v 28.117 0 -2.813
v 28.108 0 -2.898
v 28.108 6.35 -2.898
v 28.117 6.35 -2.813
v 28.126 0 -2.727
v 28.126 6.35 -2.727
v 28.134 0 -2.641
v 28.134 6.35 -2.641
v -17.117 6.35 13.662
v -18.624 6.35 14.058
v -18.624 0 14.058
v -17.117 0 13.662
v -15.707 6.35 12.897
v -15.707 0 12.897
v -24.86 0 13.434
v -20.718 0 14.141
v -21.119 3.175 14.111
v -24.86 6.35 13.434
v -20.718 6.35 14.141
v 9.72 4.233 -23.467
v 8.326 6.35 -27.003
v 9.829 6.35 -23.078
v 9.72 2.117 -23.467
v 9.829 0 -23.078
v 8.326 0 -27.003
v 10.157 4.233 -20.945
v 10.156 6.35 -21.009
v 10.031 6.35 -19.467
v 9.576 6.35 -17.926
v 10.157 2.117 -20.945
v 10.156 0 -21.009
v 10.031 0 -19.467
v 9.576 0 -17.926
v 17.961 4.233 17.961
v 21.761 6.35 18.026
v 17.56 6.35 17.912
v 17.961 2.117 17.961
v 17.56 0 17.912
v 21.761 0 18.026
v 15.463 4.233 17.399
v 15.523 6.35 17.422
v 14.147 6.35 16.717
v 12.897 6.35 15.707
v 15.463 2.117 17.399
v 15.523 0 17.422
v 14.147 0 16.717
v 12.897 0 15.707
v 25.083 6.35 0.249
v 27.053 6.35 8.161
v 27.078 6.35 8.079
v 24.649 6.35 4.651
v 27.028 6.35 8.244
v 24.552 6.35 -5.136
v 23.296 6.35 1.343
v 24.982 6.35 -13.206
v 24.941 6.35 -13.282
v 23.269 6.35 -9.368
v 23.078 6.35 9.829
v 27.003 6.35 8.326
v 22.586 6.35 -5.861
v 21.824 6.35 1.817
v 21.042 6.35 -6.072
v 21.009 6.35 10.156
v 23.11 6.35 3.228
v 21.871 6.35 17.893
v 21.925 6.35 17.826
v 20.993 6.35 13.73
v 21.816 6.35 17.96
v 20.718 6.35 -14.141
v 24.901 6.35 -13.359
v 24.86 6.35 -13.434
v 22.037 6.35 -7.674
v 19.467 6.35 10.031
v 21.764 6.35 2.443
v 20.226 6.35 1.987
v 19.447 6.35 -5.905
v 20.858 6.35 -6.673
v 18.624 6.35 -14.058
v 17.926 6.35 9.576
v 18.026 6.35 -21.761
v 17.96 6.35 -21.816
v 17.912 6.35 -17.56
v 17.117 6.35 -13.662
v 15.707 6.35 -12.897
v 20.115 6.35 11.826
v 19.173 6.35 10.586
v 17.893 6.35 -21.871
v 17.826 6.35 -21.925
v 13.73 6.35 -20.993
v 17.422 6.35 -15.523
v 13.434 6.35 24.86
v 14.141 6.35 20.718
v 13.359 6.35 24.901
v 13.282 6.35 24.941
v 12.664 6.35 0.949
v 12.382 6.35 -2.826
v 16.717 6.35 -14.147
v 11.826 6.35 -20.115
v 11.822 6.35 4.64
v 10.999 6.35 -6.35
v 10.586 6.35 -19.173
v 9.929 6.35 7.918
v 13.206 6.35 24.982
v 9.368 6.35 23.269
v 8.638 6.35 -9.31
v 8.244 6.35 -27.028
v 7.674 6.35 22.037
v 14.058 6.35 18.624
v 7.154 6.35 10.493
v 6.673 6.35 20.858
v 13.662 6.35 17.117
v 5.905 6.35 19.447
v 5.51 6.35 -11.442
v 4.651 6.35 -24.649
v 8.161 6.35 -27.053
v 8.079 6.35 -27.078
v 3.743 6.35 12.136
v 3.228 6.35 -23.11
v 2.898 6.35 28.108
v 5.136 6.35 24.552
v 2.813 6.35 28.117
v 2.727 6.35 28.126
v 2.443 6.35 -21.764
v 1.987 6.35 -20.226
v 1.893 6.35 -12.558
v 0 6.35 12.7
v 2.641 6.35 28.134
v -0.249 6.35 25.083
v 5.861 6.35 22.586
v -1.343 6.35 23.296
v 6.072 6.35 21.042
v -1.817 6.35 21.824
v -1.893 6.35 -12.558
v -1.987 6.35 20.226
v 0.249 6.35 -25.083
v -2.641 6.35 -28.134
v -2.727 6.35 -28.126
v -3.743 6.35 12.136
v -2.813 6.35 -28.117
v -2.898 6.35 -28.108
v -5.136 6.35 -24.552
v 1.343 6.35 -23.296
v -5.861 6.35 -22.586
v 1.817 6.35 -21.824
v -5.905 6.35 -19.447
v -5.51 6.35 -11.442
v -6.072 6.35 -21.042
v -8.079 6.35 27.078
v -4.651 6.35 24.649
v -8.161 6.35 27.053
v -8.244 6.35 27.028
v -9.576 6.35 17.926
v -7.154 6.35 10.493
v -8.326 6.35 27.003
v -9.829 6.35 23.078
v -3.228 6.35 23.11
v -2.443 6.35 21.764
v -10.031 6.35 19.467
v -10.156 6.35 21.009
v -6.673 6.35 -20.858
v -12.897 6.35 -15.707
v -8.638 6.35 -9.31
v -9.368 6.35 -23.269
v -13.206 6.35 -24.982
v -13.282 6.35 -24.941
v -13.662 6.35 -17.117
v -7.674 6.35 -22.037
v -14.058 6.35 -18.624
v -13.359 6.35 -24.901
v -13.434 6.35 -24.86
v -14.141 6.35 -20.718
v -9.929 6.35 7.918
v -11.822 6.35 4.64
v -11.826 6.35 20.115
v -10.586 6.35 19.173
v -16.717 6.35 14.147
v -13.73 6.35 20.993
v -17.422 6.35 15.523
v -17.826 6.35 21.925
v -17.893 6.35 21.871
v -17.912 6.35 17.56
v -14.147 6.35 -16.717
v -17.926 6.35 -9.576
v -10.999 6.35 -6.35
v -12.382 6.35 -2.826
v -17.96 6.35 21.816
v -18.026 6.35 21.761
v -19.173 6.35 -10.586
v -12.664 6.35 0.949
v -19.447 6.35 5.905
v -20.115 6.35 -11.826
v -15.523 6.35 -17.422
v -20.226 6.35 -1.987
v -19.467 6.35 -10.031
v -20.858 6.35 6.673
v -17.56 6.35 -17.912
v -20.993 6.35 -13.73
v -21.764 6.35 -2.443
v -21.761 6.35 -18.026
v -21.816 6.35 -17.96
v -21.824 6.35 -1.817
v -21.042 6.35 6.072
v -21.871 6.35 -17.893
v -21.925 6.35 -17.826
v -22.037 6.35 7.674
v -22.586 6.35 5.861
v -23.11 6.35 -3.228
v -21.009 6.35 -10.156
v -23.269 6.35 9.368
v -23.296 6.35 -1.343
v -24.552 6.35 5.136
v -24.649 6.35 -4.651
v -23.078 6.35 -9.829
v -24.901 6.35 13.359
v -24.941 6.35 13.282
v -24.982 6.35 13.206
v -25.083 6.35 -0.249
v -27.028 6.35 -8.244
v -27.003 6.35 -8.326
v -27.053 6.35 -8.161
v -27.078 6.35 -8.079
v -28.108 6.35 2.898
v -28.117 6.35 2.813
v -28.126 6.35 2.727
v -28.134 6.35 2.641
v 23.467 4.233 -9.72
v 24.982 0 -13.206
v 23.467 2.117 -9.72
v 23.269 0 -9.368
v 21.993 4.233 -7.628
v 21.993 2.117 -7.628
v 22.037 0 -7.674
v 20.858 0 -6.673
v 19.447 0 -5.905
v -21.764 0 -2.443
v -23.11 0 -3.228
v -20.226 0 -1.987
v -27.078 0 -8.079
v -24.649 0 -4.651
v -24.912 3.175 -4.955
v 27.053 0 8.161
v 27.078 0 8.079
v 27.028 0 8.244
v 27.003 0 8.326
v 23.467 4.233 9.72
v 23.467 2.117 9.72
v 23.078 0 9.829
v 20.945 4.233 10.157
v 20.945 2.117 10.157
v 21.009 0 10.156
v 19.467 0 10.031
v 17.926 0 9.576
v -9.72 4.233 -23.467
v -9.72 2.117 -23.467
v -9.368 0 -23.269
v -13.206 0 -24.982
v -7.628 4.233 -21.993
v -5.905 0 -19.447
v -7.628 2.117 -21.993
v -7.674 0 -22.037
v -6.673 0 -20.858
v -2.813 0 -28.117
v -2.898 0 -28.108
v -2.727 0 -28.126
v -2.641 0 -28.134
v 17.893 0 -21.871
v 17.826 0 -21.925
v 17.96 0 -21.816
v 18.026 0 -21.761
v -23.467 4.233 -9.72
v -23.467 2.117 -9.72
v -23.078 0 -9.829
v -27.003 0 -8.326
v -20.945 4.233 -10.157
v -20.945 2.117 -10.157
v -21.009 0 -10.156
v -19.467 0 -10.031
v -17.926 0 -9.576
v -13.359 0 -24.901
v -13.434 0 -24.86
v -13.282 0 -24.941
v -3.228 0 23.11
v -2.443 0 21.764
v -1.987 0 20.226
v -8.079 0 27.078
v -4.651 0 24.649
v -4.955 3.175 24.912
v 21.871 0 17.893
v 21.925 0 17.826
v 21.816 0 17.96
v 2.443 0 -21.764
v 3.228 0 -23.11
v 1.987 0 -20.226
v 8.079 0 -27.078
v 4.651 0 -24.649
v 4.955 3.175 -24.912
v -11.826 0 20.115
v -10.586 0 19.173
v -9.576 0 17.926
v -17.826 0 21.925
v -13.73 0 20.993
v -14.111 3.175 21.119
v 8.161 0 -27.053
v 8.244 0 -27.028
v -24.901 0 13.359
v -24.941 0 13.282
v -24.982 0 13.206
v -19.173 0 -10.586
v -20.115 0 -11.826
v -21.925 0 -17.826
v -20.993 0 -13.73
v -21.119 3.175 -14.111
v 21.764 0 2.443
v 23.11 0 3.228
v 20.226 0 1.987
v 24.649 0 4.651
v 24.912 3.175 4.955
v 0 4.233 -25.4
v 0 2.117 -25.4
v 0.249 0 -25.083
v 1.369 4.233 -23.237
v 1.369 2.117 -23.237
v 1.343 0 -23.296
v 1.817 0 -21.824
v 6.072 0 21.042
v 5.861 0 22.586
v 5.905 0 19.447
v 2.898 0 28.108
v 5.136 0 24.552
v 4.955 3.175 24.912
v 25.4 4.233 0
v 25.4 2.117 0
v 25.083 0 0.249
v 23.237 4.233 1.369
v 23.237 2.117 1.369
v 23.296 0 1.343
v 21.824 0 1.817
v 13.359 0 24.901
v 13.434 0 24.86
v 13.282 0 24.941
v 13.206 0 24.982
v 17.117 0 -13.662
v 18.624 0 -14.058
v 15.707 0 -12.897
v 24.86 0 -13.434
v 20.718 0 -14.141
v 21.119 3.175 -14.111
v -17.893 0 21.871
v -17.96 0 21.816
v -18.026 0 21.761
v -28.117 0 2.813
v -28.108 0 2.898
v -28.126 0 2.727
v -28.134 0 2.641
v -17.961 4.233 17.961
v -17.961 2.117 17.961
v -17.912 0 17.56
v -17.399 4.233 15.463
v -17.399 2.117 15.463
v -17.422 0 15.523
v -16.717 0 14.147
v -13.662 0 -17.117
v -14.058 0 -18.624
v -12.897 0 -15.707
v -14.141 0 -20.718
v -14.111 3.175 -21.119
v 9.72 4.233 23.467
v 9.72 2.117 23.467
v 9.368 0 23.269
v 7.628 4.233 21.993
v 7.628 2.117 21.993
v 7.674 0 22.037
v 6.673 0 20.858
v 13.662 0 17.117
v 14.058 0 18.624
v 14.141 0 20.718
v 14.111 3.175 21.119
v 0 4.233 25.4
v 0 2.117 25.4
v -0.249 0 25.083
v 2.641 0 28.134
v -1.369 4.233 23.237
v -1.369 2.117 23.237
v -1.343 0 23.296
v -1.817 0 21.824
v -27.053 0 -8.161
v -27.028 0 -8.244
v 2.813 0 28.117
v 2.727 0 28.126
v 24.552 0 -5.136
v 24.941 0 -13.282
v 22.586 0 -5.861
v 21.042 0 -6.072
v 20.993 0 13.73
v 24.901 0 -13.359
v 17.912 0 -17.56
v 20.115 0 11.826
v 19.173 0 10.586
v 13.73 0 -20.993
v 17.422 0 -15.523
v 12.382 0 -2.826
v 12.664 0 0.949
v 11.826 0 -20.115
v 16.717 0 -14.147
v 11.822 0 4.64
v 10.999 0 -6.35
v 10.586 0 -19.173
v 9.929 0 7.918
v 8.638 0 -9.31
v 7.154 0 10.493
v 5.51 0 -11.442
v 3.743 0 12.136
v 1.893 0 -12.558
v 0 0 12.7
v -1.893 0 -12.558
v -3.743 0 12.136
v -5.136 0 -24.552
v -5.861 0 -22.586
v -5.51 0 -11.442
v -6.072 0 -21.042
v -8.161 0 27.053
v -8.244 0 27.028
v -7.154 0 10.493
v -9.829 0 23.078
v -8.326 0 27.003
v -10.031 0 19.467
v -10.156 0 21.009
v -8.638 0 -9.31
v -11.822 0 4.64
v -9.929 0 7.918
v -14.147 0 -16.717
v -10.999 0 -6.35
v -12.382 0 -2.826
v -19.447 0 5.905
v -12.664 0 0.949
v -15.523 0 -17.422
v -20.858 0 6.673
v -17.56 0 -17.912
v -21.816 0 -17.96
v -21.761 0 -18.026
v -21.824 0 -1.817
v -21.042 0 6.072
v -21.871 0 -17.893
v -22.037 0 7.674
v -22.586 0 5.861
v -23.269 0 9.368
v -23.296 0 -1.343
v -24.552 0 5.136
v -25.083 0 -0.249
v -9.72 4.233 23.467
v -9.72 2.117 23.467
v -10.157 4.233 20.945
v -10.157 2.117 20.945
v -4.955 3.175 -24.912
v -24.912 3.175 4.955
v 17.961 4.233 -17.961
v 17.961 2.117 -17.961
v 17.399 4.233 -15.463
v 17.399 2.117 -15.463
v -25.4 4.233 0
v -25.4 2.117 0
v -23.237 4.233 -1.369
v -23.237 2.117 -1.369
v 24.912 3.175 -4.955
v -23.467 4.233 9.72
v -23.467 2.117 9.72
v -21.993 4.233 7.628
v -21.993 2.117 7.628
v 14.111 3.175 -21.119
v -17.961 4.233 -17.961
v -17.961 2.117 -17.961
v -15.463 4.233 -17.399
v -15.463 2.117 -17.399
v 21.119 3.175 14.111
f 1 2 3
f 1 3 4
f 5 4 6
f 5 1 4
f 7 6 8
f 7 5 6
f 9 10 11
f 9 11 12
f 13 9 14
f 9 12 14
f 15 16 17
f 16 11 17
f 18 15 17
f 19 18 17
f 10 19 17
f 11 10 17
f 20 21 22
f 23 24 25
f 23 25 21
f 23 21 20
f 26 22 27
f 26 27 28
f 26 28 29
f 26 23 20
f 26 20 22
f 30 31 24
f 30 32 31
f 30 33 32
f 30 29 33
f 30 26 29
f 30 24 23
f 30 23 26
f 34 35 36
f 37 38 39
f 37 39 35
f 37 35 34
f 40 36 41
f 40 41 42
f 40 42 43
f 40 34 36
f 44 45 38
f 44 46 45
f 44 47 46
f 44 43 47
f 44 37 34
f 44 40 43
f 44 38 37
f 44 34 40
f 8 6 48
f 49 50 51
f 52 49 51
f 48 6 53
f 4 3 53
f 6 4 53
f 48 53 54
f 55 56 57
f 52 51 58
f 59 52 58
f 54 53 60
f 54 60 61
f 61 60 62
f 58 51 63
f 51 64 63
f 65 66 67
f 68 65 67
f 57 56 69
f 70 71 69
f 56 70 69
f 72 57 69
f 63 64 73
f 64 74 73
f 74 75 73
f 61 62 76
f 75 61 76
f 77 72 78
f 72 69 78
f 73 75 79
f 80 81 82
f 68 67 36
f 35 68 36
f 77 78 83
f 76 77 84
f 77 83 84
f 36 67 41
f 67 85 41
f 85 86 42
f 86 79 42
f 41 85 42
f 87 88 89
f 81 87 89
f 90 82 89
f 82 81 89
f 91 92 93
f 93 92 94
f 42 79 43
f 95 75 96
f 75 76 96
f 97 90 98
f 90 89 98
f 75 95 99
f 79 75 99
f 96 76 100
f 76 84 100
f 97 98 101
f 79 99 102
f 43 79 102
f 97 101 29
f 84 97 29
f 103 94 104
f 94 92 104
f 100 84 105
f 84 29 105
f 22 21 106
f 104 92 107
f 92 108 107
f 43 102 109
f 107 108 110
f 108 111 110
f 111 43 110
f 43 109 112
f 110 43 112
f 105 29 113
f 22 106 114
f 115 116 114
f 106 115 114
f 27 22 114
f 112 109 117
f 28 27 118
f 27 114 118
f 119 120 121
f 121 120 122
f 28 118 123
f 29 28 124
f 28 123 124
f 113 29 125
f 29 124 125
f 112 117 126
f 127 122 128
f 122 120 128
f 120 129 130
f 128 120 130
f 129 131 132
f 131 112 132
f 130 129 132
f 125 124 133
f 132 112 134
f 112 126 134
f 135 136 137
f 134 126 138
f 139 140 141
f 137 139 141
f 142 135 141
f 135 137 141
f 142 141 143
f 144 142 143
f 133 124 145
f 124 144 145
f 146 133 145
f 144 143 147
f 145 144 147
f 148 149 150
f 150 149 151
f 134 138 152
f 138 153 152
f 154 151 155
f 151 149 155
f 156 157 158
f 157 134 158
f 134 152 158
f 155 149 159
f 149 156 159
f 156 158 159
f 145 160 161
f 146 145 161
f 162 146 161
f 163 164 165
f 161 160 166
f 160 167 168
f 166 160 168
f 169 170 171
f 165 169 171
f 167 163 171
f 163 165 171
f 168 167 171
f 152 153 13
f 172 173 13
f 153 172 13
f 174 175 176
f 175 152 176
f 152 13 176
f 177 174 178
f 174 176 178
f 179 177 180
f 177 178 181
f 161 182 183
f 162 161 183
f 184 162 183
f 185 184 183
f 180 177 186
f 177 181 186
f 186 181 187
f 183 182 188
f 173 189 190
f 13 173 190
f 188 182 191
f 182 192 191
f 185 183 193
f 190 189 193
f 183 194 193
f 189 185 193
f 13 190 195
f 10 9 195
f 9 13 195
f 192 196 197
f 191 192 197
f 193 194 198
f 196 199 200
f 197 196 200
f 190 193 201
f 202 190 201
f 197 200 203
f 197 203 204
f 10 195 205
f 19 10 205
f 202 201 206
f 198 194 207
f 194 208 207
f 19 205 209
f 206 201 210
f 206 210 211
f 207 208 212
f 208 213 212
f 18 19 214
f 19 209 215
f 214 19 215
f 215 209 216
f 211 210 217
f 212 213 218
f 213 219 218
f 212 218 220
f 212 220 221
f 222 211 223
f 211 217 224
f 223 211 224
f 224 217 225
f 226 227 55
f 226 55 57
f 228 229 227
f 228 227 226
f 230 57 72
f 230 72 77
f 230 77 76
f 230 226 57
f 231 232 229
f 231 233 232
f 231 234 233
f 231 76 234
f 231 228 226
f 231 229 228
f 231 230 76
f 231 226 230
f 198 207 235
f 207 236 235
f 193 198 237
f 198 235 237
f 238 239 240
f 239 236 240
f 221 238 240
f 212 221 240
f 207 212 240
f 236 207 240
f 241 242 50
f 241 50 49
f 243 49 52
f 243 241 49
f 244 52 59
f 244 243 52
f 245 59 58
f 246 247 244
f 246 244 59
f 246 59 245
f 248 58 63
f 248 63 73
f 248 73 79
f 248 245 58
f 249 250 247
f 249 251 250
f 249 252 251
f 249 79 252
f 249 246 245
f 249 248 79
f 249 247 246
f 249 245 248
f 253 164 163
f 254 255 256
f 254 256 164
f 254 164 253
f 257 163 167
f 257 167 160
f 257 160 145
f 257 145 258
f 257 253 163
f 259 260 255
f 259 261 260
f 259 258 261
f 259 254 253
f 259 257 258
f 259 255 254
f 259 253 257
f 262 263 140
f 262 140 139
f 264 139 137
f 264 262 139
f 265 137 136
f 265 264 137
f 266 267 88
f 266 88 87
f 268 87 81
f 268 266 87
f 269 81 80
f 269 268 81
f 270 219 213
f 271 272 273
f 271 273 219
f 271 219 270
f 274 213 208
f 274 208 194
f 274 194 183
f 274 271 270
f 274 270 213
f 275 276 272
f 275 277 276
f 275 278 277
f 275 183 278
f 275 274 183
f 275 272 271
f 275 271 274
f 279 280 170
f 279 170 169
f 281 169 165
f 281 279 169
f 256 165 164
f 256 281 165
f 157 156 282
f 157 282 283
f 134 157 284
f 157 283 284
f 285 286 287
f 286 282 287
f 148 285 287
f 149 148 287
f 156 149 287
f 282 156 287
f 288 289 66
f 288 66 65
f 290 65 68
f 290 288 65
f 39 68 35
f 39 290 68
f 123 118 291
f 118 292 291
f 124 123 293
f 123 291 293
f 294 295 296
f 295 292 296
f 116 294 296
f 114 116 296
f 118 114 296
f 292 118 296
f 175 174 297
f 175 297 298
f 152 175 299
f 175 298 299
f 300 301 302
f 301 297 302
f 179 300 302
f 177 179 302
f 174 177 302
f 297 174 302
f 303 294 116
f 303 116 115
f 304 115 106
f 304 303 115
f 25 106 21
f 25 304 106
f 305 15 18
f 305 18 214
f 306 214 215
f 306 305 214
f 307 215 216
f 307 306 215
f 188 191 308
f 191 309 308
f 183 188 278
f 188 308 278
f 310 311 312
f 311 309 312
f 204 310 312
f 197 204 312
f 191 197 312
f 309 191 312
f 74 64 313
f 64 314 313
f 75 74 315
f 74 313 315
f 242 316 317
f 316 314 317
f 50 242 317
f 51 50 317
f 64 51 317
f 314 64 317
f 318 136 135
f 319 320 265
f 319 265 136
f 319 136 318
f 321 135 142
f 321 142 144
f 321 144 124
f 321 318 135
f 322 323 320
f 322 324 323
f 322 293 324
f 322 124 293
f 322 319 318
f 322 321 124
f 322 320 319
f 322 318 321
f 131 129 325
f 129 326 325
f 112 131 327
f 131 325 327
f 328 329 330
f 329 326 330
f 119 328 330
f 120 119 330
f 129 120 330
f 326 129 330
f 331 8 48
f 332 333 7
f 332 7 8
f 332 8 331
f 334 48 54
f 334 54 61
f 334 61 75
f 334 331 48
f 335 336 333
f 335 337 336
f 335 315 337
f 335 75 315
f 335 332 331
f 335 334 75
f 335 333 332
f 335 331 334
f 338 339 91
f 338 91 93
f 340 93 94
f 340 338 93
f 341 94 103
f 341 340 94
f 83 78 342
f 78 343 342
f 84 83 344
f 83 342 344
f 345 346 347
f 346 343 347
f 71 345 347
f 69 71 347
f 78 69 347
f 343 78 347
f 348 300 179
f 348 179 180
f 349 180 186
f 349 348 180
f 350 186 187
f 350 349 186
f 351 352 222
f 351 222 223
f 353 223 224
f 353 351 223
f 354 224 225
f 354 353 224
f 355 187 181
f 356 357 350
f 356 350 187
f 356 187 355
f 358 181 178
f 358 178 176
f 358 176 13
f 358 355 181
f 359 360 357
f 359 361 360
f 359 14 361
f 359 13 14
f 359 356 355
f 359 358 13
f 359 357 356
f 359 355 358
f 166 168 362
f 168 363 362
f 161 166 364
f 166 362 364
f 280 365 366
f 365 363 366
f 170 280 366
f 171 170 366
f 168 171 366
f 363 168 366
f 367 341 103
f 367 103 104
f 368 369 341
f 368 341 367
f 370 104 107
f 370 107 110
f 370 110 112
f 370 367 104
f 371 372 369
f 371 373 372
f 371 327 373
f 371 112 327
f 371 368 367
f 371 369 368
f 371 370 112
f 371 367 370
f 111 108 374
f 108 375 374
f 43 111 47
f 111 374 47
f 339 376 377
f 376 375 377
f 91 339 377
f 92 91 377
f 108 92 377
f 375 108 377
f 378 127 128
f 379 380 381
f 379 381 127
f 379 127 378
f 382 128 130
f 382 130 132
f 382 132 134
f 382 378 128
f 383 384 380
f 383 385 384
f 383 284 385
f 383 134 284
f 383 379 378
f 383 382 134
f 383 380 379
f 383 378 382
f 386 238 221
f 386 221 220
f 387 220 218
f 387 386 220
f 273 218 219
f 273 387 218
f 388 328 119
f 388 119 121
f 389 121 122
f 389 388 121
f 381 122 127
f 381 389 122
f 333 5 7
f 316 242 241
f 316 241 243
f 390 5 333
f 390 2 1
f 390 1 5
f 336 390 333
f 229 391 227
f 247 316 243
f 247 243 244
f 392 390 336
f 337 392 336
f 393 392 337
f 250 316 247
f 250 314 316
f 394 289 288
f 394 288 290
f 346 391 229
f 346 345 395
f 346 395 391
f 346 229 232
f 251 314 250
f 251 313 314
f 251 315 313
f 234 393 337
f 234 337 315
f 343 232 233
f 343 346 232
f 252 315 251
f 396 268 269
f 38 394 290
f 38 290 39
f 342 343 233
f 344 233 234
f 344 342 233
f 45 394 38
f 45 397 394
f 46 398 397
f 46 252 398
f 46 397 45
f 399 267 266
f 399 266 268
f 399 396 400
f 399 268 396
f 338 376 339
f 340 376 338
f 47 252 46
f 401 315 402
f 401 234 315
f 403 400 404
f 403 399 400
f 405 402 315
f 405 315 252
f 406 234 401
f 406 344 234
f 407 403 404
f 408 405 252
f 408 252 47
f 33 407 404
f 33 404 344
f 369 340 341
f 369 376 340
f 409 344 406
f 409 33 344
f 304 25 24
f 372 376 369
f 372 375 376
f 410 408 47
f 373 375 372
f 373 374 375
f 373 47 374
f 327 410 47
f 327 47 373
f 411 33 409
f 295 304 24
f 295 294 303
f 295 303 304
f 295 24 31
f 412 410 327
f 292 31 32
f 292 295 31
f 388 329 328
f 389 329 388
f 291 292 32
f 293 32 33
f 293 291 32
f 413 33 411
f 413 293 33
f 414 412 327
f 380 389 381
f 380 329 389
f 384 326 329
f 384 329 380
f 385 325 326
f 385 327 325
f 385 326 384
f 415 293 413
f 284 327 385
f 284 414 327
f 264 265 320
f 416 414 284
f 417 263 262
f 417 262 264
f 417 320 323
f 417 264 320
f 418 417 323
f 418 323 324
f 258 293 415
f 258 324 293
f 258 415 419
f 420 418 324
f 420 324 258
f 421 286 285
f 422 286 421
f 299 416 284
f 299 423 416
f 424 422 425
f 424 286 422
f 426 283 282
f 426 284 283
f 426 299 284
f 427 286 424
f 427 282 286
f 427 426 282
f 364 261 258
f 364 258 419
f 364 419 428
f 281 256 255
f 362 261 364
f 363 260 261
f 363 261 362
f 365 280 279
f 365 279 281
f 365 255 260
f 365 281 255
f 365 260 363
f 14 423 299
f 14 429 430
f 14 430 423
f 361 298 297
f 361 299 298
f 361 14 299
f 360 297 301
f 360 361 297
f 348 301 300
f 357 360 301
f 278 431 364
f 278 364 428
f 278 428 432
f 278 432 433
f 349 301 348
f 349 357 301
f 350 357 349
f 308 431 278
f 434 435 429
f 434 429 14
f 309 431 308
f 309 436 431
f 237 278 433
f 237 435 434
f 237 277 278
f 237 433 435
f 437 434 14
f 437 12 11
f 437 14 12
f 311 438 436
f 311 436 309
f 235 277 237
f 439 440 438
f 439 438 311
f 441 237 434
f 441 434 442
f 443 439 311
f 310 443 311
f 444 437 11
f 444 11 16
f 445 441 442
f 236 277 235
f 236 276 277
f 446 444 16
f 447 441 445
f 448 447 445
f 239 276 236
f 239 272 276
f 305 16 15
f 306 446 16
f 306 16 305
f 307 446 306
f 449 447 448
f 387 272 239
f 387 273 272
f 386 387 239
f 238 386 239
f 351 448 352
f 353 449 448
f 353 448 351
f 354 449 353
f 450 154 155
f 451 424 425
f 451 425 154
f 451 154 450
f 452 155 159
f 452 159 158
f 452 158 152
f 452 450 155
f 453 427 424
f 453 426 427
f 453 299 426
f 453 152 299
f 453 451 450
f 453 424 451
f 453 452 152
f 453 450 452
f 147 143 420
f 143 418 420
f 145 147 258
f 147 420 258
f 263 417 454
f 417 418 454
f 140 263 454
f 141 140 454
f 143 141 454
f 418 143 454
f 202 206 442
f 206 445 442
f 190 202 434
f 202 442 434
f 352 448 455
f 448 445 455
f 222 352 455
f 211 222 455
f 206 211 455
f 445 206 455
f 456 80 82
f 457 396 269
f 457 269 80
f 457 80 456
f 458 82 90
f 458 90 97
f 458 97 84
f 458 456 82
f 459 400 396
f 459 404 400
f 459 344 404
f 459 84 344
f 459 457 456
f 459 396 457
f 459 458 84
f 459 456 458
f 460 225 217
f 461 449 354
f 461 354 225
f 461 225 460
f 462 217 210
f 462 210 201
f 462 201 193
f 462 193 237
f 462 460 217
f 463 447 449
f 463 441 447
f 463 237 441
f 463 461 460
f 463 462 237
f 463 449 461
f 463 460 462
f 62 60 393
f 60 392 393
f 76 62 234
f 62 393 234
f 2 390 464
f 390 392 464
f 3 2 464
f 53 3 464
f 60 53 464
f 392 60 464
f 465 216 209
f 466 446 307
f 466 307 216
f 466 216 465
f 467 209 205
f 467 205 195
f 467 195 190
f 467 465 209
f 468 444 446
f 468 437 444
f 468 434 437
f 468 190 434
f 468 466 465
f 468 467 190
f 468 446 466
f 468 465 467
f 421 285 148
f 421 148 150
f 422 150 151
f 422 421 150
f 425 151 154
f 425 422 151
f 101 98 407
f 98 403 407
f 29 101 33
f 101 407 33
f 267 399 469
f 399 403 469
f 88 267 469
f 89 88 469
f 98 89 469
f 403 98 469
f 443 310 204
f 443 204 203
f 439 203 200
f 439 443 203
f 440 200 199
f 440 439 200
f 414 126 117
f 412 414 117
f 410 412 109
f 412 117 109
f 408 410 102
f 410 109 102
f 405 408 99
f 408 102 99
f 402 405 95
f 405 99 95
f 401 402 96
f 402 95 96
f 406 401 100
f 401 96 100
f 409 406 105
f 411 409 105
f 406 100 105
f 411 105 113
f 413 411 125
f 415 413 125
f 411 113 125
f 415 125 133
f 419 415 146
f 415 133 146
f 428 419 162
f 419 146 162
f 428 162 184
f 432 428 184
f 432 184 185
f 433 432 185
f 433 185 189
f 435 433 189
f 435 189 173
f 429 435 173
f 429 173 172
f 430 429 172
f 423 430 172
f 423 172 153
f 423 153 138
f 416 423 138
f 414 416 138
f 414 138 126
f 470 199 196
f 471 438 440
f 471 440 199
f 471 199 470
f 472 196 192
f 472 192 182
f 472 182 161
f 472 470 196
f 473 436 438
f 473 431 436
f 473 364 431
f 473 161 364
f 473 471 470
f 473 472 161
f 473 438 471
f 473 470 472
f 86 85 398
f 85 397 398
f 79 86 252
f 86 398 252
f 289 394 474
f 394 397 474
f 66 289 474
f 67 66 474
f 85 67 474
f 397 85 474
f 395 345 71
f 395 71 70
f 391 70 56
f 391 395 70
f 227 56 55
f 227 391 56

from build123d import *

# Parameters (mm, degrees)
SKETCH3_R           = 19.898430298
BOSS_EXTRUDE1_DEPTH = 6.35
BOSS_EXTRUDE2_DEPTH = 6.35
CIRPATTERN1_COUNT   = 16
SKETCH5_R           = 12.7
CUT_EXTRUDE1_DEPTH  = 41.290772811


with BuildPart() as part:
    # Sketch3 → Boss-Extrude1 (new body)
    with BuildSketch(Plane(origin=(0, 0, 0), x_dir=(1, 0, 0), z_dir=(0, 1, 0))):
        with Locations(Location((0, 0, 0), (0, 0, 270))):
            Circle(SKETCH3_R)
    extrude(amount=BOSS_EXTRUDE1_DEPTH)

    # Sketch4 → Boss-Extrude2 (add)
    with BuildSketch(Plane(origin=(0, 0, 0), x_dir=(1, 0, 0), z_dir=(0, 1, 0))):
        with BuildLine():
            Line((1.988478018, 20.052825306), (1.988478018, 19.798825306))
            ThreePointArc((1.988478018, 19.798825306), (-1.950387235, 19.802613917), (-5.812829174, 19.030463612))
            Line((-5.812829174, 19.030463612), (-5.862382116, 19.279583074))
            add(Edge.make_bspline(
                [(-2.898476267, 28.108453205), (-3.6130336, 27.120887472), (-5.51050926, 24.413306859), (-6.393741318, 21.275894599), (-5.862382116, 19.279583074)],
                knots=[0.009892854, 0.009892854, 0.009892854, 0.009892854, 0.401482073, 1, 1, 1, 1], degree=3))
            ThreePointArc((-2.898476267, 28.108453205), (-2.769719343, 28.121432414), (-2.640904329, 28.133821827))
            add(Edge.make_bspline(
                [(-2.640904329, 28.133821827), (-1.747412498, 27.304635113), (-0.175879044, 25.791834729), (1.64701783, 23.095158006), (1.988478018, 21.20759249), (1.988478018, 20.052825306)],
                knots=[0.009892854, 0.009892854, 0.009892854, 0.009892854, 0.401482073, 0.665435678, 1, 1, 1, 1], degree=3))
        make_face()
    boss_extrude2 = extrude(amount=BOSS_EXTRUDE2_DEPTH)

    # CirPattern1: Boss-Extrude2 ×16 about axis
    cirpattern1_axis = Axis((0, 6.35, 0), (0, -1, 0))
    for i in range(1, CIRPATTERN1_COUNT):
        add(boss_extrude2.rotate(cirpattern1_axis, i * 360 / CIRPATTERN1_COUNT))

    # Sketch5 → Cut-Extrude1 (cut, through all)
    with BuildSketch(Plane(origin=(0, 6.35, 0), x_dir=(1, 0, 0), z_dir=(0, 1, 0))):
        with Locations(Location((0, 0, 0), (0, 0, 270))):
            Circle(SKETCH5_R)
    extrude(amount=-CUT_EXTRUDE1_DEPTH, mode=Mode.SUBTRACT)


solid = part.part
